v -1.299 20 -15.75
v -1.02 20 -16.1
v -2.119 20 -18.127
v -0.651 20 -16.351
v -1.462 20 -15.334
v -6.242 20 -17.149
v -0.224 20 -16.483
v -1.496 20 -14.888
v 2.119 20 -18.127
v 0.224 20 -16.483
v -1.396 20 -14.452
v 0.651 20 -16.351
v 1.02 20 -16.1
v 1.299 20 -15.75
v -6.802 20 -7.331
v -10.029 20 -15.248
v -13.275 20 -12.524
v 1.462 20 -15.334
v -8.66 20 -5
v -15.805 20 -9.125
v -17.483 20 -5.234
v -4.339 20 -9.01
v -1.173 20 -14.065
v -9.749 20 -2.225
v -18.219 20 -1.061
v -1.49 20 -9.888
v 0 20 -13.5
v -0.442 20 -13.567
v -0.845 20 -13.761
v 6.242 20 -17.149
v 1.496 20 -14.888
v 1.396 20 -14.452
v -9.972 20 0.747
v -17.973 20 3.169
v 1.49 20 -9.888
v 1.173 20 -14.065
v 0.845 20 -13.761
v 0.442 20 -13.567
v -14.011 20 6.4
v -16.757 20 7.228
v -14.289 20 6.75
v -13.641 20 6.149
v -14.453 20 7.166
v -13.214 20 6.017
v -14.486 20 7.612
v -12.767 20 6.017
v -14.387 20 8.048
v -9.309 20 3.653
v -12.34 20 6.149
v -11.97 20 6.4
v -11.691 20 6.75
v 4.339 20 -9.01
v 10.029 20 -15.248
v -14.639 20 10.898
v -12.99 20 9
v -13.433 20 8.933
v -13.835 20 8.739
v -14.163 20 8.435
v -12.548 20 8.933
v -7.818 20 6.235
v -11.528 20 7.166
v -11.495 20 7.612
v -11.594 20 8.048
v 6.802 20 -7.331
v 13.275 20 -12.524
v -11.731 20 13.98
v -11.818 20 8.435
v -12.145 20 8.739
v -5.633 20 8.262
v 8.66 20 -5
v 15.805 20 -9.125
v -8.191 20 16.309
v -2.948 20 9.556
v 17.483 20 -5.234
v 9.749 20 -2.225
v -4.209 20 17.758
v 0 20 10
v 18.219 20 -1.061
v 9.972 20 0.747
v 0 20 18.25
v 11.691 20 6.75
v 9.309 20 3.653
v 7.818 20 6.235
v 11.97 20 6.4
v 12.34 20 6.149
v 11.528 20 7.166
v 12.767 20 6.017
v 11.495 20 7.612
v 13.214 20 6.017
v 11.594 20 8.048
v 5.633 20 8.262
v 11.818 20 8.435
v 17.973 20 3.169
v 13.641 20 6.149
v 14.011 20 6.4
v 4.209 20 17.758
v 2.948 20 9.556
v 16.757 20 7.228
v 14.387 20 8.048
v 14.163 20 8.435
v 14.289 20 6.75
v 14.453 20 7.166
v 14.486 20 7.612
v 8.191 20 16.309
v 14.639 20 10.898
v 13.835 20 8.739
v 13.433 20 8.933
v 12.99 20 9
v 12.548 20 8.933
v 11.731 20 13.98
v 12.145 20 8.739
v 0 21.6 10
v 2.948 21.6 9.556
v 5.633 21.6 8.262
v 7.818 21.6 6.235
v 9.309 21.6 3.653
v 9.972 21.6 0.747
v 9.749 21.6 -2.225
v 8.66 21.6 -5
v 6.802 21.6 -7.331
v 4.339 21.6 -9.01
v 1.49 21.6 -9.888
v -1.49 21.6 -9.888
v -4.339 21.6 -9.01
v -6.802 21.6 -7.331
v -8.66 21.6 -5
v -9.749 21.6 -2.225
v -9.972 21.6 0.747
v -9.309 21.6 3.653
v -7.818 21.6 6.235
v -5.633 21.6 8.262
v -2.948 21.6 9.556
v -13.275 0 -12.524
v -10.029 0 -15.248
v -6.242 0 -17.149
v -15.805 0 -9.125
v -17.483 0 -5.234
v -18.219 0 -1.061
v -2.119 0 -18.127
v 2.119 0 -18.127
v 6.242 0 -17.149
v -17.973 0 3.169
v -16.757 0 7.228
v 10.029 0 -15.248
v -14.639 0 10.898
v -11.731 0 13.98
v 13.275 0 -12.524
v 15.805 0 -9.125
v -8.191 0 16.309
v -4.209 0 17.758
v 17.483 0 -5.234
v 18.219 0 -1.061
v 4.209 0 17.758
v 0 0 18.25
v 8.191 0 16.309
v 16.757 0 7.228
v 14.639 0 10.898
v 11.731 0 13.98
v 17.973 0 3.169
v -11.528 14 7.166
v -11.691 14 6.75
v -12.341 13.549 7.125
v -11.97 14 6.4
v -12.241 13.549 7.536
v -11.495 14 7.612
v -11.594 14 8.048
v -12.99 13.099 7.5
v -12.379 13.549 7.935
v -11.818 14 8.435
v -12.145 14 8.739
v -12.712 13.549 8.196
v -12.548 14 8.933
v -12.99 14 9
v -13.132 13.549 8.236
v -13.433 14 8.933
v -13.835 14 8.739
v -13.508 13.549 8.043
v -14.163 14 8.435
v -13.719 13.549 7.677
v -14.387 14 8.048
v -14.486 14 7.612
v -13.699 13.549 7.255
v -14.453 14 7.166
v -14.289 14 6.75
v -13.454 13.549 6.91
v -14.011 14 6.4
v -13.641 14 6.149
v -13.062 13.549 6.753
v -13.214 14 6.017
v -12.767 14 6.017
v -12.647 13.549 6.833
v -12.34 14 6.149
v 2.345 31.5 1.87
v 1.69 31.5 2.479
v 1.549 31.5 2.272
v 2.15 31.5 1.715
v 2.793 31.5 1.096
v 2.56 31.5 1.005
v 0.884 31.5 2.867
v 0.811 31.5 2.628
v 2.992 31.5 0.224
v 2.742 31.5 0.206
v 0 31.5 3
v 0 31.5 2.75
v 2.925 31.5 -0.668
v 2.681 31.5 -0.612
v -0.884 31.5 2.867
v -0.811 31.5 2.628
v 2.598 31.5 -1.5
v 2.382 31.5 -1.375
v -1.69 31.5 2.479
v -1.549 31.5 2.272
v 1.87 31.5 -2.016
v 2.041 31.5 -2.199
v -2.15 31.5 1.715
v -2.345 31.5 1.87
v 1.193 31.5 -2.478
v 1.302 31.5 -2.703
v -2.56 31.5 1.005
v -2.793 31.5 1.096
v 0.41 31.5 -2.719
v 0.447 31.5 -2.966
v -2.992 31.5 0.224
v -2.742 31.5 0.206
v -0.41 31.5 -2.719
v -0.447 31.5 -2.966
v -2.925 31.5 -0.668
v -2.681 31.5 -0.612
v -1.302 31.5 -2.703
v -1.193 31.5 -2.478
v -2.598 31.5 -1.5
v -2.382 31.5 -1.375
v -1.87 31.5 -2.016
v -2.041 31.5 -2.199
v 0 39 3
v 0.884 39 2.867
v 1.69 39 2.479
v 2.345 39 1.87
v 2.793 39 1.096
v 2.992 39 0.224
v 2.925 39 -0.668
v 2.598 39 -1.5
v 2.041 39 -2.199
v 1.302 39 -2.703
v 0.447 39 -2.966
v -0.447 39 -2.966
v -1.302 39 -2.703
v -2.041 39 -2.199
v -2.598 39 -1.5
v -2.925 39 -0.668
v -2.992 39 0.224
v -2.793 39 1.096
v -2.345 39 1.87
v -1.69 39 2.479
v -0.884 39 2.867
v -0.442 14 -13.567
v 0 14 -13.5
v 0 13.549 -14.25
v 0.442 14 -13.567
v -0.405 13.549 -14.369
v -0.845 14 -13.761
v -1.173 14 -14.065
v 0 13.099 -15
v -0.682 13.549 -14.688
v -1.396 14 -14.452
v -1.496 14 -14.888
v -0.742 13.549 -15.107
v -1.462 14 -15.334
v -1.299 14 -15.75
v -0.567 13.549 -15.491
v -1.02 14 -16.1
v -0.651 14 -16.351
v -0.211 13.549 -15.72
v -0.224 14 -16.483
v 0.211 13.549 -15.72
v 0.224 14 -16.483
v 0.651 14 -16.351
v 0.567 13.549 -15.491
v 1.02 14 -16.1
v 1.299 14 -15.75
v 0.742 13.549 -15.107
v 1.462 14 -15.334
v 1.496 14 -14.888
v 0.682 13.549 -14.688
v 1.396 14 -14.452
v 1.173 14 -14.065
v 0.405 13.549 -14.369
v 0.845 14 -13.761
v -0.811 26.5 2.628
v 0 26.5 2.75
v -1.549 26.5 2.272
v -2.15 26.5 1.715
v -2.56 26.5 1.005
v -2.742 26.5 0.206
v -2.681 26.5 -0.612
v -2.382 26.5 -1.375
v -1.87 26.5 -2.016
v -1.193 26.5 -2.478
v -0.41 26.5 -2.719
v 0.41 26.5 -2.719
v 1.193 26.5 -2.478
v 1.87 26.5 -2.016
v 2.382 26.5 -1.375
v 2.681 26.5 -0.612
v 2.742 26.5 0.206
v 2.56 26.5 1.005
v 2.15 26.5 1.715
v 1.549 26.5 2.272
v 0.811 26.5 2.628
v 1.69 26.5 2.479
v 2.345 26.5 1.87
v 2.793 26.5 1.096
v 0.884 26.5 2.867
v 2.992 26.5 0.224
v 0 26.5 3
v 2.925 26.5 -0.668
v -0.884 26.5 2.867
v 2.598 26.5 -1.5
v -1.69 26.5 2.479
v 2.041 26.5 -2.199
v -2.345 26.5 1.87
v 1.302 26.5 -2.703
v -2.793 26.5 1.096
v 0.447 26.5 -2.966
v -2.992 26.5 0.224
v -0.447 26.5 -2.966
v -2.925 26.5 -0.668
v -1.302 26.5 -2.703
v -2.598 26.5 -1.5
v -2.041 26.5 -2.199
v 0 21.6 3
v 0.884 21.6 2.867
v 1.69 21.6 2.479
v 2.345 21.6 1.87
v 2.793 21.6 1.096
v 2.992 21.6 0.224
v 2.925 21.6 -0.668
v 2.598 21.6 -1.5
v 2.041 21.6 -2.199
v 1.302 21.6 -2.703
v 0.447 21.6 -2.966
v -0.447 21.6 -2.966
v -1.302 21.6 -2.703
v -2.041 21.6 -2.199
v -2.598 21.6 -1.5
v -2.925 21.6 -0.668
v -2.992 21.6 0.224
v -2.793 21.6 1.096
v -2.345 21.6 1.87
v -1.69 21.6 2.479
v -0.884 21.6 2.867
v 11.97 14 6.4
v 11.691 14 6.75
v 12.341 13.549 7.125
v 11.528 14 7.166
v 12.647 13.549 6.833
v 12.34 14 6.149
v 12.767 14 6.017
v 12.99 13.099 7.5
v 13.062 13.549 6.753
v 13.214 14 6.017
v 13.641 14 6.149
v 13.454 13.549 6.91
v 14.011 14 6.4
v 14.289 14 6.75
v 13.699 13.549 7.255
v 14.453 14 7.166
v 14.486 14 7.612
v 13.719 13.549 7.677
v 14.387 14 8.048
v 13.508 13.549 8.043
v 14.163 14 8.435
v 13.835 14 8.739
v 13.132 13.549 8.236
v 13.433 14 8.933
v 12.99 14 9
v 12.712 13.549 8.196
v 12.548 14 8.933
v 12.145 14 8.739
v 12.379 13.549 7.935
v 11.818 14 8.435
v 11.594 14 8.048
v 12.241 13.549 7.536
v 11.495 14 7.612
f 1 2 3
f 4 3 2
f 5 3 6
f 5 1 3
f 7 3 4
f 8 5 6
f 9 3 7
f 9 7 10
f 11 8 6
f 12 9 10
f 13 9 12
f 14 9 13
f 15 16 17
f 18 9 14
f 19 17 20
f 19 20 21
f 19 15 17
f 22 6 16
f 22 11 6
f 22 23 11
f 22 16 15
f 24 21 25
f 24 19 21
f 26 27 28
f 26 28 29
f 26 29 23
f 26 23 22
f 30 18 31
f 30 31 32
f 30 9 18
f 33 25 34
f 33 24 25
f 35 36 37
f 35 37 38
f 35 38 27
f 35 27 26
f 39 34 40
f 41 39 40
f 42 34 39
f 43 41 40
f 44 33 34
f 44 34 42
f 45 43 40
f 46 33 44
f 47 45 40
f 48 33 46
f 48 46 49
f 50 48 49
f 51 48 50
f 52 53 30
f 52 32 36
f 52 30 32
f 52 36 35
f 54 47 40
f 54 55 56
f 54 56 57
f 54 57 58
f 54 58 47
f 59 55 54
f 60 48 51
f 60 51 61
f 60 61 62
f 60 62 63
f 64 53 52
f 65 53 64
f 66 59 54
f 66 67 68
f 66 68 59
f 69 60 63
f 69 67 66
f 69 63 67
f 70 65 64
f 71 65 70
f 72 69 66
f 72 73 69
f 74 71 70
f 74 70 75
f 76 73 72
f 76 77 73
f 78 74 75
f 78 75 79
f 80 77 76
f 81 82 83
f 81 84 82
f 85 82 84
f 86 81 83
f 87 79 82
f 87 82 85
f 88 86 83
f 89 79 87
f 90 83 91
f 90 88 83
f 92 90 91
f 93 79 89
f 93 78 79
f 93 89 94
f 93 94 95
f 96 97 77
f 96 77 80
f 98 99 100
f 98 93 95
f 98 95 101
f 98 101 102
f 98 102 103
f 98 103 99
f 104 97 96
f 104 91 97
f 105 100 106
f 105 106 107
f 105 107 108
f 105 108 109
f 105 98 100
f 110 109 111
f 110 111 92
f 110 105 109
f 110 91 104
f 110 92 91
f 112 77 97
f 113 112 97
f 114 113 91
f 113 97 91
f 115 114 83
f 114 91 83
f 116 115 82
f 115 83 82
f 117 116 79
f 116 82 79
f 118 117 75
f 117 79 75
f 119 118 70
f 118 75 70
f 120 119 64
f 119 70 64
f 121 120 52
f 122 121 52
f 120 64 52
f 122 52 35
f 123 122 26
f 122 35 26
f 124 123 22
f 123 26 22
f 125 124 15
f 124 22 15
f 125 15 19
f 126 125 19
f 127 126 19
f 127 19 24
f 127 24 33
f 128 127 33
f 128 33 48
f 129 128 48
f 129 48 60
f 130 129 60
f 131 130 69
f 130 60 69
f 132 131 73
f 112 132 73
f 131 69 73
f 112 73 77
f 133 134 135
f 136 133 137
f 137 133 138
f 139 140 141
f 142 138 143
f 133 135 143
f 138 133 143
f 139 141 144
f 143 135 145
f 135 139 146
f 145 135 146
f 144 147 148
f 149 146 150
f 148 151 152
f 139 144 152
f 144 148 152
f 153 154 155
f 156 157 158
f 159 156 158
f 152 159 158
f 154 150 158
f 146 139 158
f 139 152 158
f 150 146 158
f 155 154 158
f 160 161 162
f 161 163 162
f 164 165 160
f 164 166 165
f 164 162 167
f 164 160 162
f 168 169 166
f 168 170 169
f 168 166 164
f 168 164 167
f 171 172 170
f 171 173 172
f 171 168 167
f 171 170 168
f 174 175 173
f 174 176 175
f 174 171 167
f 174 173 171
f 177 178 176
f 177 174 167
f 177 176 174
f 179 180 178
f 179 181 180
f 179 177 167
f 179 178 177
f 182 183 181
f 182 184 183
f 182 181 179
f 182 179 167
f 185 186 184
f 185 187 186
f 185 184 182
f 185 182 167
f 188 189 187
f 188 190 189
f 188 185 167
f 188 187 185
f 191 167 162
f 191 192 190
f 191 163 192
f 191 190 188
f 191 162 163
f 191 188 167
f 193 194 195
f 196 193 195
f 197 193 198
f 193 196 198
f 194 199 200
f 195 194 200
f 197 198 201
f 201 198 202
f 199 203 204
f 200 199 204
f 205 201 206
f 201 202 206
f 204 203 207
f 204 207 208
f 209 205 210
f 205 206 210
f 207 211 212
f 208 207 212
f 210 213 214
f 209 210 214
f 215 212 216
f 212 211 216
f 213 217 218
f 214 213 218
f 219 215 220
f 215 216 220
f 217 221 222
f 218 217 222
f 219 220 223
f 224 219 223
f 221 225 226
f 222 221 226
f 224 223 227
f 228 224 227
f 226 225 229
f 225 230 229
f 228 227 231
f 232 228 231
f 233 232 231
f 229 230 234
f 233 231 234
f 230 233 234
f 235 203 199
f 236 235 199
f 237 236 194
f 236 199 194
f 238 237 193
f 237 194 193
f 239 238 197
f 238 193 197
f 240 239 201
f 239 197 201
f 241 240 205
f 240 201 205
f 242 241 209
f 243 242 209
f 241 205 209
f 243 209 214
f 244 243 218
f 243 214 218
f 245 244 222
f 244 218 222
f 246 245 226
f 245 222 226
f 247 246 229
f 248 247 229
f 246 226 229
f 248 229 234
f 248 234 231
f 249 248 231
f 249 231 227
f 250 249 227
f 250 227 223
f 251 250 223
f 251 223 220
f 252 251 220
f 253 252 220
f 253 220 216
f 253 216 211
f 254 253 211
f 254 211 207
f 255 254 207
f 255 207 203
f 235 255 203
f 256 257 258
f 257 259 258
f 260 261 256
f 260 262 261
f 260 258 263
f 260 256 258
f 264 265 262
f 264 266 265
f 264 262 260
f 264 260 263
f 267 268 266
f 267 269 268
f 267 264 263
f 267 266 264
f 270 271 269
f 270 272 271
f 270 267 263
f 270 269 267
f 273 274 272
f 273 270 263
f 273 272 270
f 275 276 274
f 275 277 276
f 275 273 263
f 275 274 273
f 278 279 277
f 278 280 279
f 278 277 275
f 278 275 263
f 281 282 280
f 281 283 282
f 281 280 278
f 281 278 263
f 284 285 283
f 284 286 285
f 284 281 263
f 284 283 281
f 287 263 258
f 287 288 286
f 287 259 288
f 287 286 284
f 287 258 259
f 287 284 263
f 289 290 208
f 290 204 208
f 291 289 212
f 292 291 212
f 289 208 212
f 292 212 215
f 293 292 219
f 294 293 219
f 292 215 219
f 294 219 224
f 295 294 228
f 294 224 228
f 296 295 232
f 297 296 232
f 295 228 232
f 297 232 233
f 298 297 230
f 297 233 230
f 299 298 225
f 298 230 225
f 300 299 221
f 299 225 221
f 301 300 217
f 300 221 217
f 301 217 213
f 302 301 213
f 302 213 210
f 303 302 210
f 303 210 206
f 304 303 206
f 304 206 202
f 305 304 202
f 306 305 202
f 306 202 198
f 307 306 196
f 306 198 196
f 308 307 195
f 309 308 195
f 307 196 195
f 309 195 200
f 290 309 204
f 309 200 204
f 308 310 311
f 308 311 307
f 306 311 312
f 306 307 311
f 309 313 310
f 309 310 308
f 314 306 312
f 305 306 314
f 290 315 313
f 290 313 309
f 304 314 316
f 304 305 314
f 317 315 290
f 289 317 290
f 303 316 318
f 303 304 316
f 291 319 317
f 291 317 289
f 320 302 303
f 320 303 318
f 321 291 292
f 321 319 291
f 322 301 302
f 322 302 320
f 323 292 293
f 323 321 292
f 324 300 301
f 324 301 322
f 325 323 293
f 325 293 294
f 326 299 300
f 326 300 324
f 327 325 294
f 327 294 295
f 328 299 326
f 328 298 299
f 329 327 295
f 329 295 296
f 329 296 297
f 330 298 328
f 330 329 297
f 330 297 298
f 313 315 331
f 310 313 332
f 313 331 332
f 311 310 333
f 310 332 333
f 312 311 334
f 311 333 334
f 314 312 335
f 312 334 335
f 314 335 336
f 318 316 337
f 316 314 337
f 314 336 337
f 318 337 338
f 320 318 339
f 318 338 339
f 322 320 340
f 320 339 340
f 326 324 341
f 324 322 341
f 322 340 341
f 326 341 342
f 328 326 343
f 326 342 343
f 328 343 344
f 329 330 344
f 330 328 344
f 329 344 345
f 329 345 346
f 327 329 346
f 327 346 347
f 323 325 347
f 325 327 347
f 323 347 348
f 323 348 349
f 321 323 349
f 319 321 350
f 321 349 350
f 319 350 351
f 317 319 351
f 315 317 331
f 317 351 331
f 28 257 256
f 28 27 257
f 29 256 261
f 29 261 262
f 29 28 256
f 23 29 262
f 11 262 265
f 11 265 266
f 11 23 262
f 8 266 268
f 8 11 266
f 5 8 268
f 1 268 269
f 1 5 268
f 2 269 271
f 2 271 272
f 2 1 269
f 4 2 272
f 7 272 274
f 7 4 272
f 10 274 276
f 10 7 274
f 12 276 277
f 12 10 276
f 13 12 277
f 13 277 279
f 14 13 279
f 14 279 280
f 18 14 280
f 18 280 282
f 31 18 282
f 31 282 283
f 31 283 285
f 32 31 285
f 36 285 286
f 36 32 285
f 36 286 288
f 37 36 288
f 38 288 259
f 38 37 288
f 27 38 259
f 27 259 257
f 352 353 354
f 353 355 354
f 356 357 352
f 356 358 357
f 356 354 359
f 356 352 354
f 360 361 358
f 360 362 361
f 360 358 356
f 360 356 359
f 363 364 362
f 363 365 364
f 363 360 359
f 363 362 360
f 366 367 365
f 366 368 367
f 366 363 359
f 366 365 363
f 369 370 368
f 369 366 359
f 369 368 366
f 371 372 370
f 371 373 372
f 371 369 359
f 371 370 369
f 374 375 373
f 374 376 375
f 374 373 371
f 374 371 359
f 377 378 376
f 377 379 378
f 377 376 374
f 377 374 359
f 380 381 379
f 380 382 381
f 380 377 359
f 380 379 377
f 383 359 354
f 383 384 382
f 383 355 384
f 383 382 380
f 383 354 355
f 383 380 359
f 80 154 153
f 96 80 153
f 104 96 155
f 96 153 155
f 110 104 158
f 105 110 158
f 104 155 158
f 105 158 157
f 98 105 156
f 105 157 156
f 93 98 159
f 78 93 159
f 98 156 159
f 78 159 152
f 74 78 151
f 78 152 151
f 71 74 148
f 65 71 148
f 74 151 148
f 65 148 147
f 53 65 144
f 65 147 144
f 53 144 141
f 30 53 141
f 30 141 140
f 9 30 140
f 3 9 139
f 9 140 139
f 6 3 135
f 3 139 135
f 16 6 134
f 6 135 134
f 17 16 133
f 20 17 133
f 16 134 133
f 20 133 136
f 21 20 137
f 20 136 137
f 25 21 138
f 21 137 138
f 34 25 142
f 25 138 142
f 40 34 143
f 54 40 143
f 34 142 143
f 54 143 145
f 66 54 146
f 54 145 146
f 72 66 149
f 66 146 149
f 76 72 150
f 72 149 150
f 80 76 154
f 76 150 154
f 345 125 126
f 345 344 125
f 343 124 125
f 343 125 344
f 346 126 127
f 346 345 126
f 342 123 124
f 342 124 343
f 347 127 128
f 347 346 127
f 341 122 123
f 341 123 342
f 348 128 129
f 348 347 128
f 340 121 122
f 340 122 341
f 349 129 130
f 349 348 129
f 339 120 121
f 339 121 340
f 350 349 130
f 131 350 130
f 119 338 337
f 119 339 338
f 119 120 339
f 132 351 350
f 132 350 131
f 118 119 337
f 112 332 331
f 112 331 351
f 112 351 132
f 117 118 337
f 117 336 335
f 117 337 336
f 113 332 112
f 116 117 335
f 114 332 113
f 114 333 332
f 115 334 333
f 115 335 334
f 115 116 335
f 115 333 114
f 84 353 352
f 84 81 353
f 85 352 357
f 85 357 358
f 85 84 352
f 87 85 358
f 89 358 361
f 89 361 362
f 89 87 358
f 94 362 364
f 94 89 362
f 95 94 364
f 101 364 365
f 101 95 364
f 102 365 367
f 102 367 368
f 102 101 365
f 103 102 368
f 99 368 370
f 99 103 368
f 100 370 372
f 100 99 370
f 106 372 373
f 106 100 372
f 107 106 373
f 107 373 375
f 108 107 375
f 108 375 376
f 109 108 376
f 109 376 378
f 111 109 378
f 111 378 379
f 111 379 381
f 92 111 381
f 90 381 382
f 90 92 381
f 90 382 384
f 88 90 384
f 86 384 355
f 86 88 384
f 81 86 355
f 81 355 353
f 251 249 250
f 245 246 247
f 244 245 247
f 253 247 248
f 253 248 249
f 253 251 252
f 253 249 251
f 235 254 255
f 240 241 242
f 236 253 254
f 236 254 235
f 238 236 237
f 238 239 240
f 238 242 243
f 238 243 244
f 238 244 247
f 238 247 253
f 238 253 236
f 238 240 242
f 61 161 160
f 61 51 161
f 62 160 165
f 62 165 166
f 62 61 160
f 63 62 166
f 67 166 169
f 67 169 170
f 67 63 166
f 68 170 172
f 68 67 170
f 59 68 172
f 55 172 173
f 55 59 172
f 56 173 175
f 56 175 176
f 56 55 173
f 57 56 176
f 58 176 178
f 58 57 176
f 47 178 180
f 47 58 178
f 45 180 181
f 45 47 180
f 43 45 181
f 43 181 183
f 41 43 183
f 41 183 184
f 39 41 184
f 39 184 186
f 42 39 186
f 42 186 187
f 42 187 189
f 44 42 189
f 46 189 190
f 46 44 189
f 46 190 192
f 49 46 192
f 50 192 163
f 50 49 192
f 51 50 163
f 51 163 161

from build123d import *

# Parameters (mm, degrees)
SKETCH1_R           = 18.25
BOSS_EXTRUDE1_DEPTH = 20
SKETCH2_R           = 10
BOSS_EXTRUDE2_DEPTH = 1.6
SKETCH3_R           = 3
BOSS_EXTRUDE3_DEPTH = 17.4
SKETCH4_W           = 0.25
SKETCH4_H           = 5
CIRPATTERN1_COUNT   = 3


with BuildPart() as part:
    # Sketch1 → Boss-Extrude1 (new body)
    with BuildSketch(Plane(origin=(0, 0, 0), x_dir=(1, 0, 0), z_dir=(0, 1, 0))):
        with Locations(Location((0, 0, 0), (0, 0, 270))):
            Circle(SKETCH1_R)
    extrude(amount=BOSS_EXTRUDE1_DEPTH)

    # Sketch2 → Boss-Extrude2 (add)
    with BuildSketch(Plane(origin=(0, 20, 0), x_dir=(1, 0, 0), z_dir=(0, 1, 0))):
        with Locations(Location((0, 0, 0), (0, 0, 270))):
            Circle(SKETCH2_R)
    extrude(amount=BOSS_EXTRUDE2_DEPTH)

    # Sketch3 → Boss-Extrude3 (add)
    with BuildSketch(Plane(origin=(0, 21.6, 0), x_dir=(1, 0, 0), z_dir=(0, 1, 0))):
        with Locations(Location((0, 0, 0), (0, 0, 270))):
            Circle(SKETCH3_R)
    extrude(amount=BOSS_EXTRUDE3_DEPTH)

    # Sketch4 → Cut-Revolve1 (revolve, cut)
    with BuildSketch(Plane(origin=(0, 0, 0), x_dir=(0, 0, -1), z_dir=(1, 0, 0)), mode=Mode.PRIVATE) as cut_revolve1_sk:
        with Locations((2.875, 29)):
            Rectangle(SKETCH4_W, SKETCH4_H)
    revolve(cut_revolve1_sk.sketch.rotate(Axis((0, 39, 0), (0, -1, 0)), 180), axis=Axis((0, 39, 0), (0, -1, 0)), mode=Mode.SUBTRACT)

    # Sketch7 → Ø3.0mm Dowel Hole1 (revolve, cut)
    with BuildSketch(Plane(origin=(0, 20, -15), x_dir=(0, 0, 1), z_dir=(1, 0, 0))):
        Polygon((0, 0), (0, 6.901290929), (1.5, 6), (1.5, 0), align=None)
    f_3_0mm_dowel_hole1 = revolve(axis=Axis((0, 26.35, -15), (0, -1, 0)), mode=Mode.SUBTRACT)

    # CirPattern1: Ø3.0mm Dowel Hole1 ×3 about axis
    cirpattern1_axis = Axis((0, 0, 0), (0, 1, 0))
    for i in range(1, CIRPATTERN1_COUNT):
        add(f_3_0mm_dowel_hole1.rotate(cirpattern1_axis, i * 360 / CIRPATTERN1_COUNT), mode=Mode.SUBTRACT)


solid = part.part
